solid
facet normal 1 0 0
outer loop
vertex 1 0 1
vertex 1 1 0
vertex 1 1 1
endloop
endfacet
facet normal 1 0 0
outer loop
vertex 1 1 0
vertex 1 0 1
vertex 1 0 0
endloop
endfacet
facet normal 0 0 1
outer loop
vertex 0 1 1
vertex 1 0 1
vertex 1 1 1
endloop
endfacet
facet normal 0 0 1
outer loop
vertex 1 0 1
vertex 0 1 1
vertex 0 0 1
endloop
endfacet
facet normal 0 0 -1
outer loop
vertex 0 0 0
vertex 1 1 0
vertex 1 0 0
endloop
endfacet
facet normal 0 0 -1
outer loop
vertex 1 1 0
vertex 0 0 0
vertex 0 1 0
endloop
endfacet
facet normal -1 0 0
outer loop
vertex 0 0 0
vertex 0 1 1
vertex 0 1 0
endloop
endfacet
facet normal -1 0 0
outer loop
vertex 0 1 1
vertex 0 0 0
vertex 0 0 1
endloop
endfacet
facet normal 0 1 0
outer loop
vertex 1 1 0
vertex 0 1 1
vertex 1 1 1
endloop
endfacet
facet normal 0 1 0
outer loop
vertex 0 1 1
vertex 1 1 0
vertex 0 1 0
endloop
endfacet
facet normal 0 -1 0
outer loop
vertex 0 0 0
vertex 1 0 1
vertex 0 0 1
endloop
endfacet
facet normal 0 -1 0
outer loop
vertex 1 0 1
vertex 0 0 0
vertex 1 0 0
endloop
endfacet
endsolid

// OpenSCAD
union() {
	%cube(size = [256, 160, 100]);
	translate(v = [0.0, 0.0, 0.0]) {
		cube(size = [1, 1, 1]);
	}
	translate(v = [0.0, 0.0, 0.0]) {
		cube(size = [1, 1, 1]);
	}
	translate(v = [0.0, 0.0, 0.0]) {
		cube(size = [1, 1, 1]);
	}
	translate(v = [0.0, 0.0, 0.0]) {
		cube(size = [1, 1, 1]);
	}
	translate(v = [0.0, 0.0, 0.0]) {
		cube(size = [1, 1, 1]);
	}
	translate(v = [0.0, 0.0, 0.0]) {
		cube(size = [1, 1, 1]);
	}
	translate(v = [0.0, 0.0, 0.0]) {
		cube(size = [1, 1, 1]);
	}
	translate(v = [0.0, 0.0, 0.0]) {
		cube(size = [1, 1, 1]);
	}
	translate(v = [0.0, 0.0, 0.0]) {
		cube(size = [1, 1, 1]);
	}
	translate(v = [0.0, 0.0, 0.0]) {
		cube(size = [1, 1, 1]);
	}
	translate(v = [0, 0, 0]) {
		cube(size = [1, 1, 1]);
	}
	translate(v = [0.0, 0.0, 0.0]) {
		rotate(a = [0, 90.0, 0.0]) {
			cube(size = [1, 1, 0.0]);
		}
	}
	translate(v = [0.0, 0.0, 0.0]) {
		rotate(a = [0, 90.0, 0.0]) {
			cube(size = [1, 1, 0.0]);
		}
	}
	translate(v = [0.0, 0.0, 0.0]) {
		rotate(a = [0, 90.0, 0.0]) {
			cube(size = [1, 1, 0.0]);
		}
	}
	translate(v = [0.0, 0.0, 0.0]) {
		rotate(a = [0, 90.0, 0.0]) {
			cube(size = [1, 1, 0.0]);
		}
	}
	translate(v = [0.0, 0.0, 0.0]) {
		rotate(a = [0, 90.0, 0.0]) {
			cube(size = [1, 1, 0.0]);
		}
	}
	translate(v = [0, 0, 0]) {
		rotate(a = [0, 90.0, 0.0]) {
			cube(size = [1, 1, 0.0]);
		}
	}
	translate(v = [0.0, 0.0, 0.0]) {
		rotate(a = [0, 90.0, 0.0]) {
			cube(size = [1, 1, 0.0]);
		}
	}
	translate(v = [0, 0, 0]) {
		rotate(a = [0, 90.0, 0.0]) {
			cube(size = [1, 1, 0.0]);
		}
	}
	translate(v = [0.0, 0.0, 0.0]) {
		rotate(a = [0, 90.0, 0.0]) {
			cube(size = [1, 1, 0.0]);
		}
	}
	translate(v = [0.0, 0.0, 0.0]) {
		rotate(a = [0, 90.0, 0.0]) {
			cube(size = [1, 1, 0.0]);
		}
	}
	translate(v = [0.0, 0.0, 0.0]) {
		rotate(a = [0, 90.0, 0.0]) {
			cube(size = [1, 1, 0.0]);
		}
	}
}
